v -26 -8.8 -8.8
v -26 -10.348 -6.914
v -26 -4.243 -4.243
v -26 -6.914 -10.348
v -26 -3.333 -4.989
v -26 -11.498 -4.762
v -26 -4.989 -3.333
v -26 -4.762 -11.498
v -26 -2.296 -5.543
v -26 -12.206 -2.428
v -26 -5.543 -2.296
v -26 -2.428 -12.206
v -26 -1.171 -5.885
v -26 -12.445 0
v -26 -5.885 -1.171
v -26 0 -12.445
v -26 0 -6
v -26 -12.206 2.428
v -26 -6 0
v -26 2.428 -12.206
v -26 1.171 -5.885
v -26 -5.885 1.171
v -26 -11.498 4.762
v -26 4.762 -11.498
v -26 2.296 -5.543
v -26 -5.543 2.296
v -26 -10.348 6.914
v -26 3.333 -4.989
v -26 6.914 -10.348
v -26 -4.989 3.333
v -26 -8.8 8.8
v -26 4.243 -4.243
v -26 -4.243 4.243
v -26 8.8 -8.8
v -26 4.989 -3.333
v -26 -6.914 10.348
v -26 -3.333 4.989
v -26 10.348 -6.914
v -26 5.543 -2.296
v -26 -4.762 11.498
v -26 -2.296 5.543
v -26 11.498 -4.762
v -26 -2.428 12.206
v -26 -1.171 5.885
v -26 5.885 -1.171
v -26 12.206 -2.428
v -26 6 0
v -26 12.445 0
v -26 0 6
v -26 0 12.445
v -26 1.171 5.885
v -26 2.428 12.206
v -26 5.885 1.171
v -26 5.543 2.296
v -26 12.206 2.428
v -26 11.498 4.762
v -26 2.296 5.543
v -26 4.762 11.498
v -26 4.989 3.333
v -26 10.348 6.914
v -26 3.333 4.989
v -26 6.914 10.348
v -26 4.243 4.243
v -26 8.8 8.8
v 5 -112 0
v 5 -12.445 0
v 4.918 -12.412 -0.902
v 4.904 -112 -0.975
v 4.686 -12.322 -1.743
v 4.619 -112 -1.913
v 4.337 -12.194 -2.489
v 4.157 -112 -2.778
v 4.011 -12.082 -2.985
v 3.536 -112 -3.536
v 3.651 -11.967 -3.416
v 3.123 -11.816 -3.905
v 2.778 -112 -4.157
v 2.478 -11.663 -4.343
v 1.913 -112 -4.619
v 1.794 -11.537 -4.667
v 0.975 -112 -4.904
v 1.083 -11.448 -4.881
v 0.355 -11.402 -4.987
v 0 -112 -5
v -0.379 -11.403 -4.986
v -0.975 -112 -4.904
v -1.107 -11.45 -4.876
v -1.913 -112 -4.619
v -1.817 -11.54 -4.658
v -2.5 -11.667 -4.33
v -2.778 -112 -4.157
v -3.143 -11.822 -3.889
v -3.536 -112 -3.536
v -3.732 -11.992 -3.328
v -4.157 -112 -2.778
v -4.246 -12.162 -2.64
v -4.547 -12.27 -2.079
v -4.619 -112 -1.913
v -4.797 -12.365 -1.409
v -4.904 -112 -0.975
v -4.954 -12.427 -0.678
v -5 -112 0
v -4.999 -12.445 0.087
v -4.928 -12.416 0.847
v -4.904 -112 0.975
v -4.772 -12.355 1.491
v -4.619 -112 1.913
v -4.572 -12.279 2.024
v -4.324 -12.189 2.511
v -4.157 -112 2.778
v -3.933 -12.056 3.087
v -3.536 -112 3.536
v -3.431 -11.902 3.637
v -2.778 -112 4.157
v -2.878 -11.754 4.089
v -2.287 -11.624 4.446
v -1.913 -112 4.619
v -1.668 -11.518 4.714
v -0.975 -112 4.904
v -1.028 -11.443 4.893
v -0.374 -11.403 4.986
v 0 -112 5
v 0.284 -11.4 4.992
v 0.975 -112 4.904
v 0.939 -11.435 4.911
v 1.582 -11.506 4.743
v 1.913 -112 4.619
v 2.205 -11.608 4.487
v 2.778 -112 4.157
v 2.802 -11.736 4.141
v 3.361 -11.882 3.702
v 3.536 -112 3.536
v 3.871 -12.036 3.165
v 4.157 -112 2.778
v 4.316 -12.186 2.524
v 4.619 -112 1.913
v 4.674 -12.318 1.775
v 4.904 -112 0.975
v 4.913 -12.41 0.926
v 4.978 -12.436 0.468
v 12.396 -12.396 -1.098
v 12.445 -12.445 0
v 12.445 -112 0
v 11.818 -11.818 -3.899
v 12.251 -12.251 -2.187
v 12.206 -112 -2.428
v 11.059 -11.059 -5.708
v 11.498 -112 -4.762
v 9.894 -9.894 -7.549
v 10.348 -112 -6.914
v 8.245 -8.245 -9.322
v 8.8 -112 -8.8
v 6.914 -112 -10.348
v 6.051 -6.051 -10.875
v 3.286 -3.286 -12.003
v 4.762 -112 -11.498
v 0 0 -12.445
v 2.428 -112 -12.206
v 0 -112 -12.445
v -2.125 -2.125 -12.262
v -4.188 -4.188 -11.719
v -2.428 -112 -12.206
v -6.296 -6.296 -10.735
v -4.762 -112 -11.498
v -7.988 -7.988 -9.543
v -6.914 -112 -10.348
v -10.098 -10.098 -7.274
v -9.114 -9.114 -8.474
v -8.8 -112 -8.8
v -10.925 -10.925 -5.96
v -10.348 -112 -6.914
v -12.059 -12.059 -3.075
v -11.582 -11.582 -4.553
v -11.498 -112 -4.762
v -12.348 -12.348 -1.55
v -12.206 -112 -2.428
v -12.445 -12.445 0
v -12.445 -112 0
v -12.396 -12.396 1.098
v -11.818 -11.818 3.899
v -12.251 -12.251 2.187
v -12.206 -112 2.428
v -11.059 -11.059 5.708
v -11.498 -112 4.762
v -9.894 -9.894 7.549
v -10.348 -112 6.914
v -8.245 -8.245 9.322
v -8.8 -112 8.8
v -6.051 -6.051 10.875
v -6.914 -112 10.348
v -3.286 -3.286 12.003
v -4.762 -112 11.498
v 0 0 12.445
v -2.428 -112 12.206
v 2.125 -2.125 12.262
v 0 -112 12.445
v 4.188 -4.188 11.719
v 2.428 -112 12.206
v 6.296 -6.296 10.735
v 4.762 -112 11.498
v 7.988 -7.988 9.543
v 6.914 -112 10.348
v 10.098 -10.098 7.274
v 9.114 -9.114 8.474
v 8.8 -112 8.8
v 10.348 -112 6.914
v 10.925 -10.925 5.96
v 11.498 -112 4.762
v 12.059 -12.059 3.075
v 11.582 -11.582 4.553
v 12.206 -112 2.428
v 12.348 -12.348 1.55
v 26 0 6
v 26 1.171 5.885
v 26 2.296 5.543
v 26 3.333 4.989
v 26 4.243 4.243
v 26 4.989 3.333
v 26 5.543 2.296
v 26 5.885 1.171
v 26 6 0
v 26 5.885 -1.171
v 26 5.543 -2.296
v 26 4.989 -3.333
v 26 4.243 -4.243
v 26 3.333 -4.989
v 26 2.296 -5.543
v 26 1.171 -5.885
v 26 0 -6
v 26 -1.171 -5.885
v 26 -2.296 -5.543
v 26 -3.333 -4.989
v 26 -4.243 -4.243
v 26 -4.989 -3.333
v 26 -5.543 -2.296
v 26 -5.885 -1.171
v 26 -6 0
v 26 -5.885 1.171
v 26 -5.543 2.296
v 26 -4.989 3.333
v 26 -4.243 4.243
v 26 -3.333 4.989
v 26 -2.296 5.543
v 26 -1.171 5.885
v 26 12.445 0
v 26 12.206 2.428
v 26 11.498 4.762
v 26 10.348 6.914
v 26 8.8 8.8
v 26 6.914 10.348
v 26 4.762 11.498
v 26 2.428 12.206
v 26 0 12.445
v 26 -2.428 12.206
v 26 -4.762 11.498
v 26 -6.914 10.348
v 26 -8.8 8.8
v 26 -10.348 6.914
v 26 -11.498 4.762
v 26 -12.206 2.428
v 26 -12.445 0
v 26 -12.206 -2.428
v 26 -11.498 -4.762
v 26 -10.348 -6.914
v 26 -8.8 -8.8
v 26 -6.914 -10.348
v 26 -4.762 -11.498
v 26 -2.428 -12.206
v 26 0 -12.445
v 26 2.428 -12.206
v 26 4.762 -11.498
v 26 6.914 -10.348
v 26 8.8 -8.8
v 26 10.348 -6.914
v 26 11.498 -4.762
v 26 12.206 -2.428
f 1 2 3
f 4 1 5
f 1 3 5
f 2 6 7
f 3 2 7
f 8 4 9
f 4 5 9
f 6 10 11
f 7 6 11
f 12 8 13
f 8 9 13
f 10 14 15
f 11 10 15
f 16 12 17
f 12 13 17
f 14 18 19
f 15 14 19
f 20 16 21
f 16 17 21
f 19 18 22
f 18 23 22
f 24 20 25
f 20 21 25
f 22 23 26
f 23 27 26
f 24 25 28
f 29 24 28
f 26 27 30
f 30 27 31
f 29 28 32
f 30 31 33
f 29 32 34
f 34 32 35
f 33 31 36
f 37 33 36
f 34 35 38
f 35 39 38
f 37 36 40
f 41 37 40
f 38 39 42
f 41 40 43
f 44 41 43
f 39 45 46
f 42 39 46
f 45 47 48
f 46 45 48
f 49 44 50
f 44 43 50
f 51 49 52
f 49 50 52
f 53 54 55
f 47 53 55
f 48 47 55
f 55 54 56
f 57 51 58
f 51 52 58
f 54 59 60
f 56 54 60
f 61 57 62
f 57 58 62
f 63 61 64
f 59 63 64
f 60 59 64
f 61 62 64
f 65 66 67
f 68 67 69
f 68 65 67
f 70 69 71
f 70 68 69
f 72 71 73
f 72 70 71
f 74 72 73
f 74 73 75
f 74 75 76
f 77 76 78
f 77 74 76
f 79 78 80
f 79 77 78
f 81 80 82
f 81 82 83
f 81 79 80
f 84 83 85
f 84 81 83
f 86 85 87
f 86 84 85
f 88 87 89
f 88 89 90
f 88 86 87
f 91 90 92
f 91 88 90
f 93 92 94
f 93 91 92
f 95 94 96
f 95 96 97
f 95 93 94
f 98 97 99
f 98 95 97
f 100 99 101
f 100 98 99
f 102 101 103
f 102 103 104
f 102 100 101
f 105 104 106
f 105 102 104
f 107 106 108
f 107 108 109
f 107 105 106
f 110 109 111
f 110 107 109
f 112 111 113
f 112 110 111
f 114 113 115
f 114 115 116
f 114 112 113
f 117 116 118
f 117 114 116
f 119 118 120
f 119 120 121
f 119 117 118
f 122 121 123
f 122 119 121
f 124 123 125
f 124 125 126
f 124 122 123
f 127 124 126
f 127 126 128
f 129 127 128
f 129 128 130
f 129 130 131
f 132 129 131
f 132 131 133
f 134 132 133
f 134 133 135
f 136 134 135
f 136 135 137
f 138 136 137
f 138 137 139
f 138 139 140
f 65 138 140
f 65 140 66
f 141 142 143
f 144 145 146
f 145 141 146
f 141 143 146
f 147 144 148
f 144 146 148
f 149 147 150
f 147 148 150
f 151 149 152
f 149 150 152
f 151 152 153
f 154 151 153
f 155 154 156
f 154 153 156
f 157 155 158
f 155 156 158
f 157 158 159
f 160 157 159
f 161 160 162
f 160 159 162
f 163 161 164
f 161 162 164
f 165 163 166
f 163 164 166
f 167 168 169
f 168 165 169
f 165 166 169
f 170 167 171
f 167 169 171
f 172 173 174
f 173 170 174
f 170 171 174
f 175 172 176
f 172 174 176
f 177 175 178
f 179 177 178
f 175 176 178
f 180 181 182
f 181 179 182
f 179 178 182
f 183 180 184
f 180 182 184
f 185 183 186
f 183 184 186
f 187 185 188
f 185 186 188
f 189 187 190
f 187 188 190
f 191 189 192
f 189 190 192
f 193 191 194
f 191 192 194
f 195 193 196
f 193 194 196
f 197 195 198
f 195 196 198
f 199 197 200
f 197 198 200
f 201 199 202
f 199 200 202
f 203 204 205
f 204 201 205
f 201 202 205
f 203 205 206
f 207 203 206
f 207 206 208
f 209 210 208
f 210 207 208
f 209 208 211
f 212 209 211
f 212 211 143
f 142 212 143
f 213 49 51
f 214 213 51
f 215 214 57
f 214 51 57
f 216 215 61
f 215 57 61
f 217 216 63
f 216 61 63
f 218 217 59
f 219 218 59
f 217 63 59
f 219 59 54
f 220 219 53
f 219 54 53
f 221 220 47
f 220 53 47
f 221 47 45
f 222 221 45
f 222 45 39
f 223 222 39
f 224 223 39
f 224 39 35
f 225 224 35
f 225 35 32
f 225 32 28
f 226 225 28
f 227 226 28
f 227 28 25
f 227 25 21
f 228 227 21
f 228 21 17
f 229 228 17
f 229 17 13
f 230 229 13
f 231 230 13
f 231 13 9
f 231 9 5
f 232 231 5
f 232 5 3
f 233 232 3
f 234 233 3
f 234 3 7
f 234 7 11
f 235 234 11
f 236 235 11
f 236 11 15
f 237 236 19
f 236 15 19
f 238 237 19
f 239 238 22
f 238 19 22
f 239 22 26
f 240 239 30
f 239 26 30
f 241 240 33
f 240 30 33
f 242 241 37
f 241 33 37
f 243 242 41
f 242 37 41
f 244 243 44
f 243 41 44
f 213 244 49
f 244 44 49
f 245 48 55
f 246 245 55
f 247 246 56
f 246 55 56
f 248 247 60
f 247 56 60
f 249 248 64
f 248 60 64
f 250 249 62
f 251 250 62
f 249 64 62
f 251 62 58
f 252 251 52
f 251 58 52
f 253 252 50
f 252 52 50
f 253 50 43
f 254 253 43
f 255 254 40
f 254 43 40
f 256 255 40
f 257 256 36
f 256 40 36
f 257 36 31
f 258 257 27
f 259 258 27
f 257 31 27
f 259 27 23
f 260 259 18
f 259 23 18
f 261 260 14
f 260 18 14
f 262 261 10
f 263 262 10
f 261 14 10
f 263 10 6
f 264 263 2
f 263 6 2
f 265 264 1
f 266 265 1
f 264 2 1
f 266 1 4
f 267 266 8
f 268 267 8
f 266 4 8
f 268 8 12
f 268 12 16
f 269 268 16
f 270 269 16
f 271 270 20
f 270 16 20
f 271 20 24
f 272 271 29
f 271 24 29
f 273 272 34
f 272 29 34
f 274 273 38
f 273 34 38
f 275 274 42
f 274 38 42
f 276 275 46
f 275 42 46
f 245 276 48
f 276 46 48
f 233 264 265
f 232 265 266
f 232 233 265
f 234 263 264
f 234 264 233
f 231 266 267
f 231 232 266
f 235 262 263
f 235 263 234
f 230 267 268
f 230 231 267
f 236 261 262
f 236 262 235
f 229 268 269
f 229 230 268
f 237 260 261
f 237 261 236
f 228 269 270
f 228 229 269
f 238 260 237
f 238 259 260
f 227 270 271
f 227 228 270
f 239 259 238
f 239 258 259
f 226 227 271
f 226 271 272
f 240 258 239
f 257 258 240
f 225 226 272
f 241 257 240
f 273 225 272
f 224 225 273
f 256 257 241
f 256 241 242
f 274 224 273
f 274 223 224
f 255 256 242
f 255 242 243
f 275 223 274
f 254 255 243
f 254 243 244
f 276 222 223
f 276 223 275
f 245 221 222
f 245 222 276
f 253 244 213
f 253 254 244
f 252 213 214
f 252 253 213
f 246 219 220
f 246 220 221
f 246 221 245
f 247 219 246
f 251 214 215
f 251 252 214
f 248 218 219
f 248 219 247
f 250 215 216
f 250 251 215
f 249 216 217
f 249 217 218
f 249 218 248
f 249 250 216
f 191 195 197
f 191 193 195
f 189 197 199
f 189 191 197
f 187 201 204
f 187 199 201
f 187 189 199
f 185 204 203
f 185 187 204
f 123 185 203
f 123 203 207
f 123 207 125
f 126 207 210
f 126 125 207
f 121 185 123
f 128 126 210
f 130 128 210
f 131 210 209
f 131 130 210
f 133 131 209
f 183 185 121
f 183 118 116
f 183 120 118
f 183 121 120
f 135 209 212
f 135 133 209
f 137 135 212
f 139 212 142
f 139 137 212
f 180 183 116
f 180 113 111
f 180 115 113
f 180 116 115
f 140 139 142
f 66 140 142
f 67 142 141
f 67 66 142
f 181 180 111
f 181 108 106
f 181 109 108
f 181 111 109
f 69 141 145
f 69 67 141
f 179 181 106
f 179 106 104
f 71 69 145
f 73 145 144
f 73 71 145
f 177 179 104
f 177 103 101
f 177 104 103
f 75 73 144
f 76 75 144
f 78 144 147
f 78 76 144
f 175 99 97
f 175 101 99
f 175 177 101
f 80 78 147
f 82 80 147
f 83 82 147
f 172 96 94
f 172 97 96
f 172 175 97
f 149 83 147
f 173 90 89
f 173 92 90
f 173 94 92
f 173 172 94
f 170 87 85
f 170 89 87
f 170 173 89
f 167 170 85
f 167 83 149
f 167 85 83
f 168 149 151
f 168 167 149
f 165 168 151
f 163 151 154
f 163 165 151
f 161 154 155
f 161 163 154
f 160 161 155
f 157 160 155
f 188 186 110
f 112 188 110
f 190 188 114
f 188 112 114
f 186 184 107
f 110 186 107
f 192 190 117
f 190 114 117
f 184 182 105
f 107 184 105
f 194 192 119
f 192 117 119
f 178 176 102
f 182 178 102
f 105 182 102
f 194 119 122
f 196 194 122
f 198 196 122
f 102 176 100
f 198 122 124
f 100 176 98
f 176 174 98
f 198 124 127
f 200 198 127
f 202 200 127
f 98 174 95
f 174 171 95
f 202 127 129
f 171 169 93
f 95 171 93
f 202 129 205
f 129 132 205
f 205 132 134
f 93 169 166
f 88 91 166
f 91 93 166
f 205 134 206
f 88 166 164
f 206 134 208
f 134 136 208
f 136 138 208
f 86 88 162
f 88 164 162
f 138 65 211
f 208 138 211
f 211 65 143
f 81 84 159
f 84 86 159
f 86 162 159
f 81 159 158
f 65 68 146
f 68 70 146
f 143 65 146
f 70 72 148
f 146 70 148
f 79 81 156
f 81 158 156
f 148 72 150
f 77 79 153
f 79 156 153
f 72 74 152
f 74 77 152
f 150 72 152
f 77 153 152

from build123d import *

# Parameters (mm, degrees)
PIPE_START                      = -112
PIPE_26_9_X_3_2_1_OUTLINE_R     = 12.445
PIPE_26_9_X_3_2_1_OUTLINE_R_2   = 5
PIPE_26_9_X_3_2_1_DEPTH         = 99.5549999
PIPE_START_2                    = -12.4450001
PIPE_26_9_X_3_2_1_2_OUTLINE_R   = 12.445
PIPE_26_9_X_3_2_1_2_OUTLINE_R_2 = 5
PIPE_26_9_X_3_2_1_2_DEPTH       = 12.4450002
PIPE_START_3                    = -13
PIPE_26_9_X_3_2_1_3_DEPTH       = 26
PIPE_START_4                    = -26
PIPE_26_9_X_3_2_1_4_OUTLINE_R   = 12.445
PIPE_26_9_X_3_2_1_4_OUTLINE_R_2 = 5
PIPE_26_9_X_3_2_1_4_DEPTH       = 52
SKETCH13_R                      = 6
CUT_EXTRUDE1_DEPTH              = 57


with BuildPart() as part:
    # Pipe 26.9 X 3.2(1): read off the stored shape, not the designer's step
    # Pipe 26.9 X 3.2(1) outline → Pipe 26.9 X 3.2(1) (new body)
    with BuildSketch(Plane(origin=(0, 0, 0), x_dir=(1, 0, 0), z_dir=(0, 1, 0)).offset(PIPE_START)):
        Circle(PIPE_26_9_X_3_2_1_OUTLINE_R)
        Circle(PIPE_26_9_X_3_2_1_OUTLINE_R_2, mode=Mode.SUBTRACT)
    extrude(amount=PIPE_26_9_X_3_2_1_DEPTH)

    # Pipe 26.9 X 3.2_1 2 outline → Pipe 26.9 X 3.2_1 2 (add)
    with BuildSketch(Plane(origin=(0, 0, 0), x_dir=(1, 0, 0), z_dir=(0, 1, 0)).offset(PIPE_START_2)):
        Circle(PIPE_26_9_X_3_2_1_2_OUTLINE_R)
        Circle(PIPE_26_9_X_3_2_1_2_OUTLINE_R_2, mode=Mode.SUBTRACT)
    extrude(amount=PIPE_26_9_X_3_2_1_2_DEPTH)

    # Pipe 26.9 X 3.2_1 3 outline → Pipe 26.9 X 3.2_1 3 (cut)
    with BuildSketch(Plane.YZ.offset(PIPE_START_3)):
        with BuildLine():
            ThreePointArc((0, 12.445), (-12.445, 0), (0, -12.445))
            Line((0, -12.445), (0, 12.445))
        make_face()
    extrude(amount=PIPE_26_9_X_3_2_1_3_DEPTH, mode=Mode.SUBTRACT)


with BuildPart() as body_2:
    # Pipe 26.9 X 3.2_1 4 outline → Pipe 26.9 X 3.2_1 4 (new body)
    with BuildSketch(Plane.YZ.offset(PIPE_START_4)):
        Circle(PIPE_26_9_X_3_2_1_4_OUTLINE_R)
        Circle(PIPE_26_9_X_3_2_1_4_OUTLINE_R_2, mode=Mode.SUBTRACT)
    extrude(amount=PIPE_26_9_X_3_2_1_4_DEPTH)

    # Sketch13 → Cut-Extrude1 (cut)
    with BuildSketch(Plane.ZY.offset(26)):
        Circle(SKETCH13_R)
    extrude(amount=-CUT_EXTRUDE1_DEPTH, mode=Mode.SUBTRACT)


solid = Compound([part.part, body_2.part])
